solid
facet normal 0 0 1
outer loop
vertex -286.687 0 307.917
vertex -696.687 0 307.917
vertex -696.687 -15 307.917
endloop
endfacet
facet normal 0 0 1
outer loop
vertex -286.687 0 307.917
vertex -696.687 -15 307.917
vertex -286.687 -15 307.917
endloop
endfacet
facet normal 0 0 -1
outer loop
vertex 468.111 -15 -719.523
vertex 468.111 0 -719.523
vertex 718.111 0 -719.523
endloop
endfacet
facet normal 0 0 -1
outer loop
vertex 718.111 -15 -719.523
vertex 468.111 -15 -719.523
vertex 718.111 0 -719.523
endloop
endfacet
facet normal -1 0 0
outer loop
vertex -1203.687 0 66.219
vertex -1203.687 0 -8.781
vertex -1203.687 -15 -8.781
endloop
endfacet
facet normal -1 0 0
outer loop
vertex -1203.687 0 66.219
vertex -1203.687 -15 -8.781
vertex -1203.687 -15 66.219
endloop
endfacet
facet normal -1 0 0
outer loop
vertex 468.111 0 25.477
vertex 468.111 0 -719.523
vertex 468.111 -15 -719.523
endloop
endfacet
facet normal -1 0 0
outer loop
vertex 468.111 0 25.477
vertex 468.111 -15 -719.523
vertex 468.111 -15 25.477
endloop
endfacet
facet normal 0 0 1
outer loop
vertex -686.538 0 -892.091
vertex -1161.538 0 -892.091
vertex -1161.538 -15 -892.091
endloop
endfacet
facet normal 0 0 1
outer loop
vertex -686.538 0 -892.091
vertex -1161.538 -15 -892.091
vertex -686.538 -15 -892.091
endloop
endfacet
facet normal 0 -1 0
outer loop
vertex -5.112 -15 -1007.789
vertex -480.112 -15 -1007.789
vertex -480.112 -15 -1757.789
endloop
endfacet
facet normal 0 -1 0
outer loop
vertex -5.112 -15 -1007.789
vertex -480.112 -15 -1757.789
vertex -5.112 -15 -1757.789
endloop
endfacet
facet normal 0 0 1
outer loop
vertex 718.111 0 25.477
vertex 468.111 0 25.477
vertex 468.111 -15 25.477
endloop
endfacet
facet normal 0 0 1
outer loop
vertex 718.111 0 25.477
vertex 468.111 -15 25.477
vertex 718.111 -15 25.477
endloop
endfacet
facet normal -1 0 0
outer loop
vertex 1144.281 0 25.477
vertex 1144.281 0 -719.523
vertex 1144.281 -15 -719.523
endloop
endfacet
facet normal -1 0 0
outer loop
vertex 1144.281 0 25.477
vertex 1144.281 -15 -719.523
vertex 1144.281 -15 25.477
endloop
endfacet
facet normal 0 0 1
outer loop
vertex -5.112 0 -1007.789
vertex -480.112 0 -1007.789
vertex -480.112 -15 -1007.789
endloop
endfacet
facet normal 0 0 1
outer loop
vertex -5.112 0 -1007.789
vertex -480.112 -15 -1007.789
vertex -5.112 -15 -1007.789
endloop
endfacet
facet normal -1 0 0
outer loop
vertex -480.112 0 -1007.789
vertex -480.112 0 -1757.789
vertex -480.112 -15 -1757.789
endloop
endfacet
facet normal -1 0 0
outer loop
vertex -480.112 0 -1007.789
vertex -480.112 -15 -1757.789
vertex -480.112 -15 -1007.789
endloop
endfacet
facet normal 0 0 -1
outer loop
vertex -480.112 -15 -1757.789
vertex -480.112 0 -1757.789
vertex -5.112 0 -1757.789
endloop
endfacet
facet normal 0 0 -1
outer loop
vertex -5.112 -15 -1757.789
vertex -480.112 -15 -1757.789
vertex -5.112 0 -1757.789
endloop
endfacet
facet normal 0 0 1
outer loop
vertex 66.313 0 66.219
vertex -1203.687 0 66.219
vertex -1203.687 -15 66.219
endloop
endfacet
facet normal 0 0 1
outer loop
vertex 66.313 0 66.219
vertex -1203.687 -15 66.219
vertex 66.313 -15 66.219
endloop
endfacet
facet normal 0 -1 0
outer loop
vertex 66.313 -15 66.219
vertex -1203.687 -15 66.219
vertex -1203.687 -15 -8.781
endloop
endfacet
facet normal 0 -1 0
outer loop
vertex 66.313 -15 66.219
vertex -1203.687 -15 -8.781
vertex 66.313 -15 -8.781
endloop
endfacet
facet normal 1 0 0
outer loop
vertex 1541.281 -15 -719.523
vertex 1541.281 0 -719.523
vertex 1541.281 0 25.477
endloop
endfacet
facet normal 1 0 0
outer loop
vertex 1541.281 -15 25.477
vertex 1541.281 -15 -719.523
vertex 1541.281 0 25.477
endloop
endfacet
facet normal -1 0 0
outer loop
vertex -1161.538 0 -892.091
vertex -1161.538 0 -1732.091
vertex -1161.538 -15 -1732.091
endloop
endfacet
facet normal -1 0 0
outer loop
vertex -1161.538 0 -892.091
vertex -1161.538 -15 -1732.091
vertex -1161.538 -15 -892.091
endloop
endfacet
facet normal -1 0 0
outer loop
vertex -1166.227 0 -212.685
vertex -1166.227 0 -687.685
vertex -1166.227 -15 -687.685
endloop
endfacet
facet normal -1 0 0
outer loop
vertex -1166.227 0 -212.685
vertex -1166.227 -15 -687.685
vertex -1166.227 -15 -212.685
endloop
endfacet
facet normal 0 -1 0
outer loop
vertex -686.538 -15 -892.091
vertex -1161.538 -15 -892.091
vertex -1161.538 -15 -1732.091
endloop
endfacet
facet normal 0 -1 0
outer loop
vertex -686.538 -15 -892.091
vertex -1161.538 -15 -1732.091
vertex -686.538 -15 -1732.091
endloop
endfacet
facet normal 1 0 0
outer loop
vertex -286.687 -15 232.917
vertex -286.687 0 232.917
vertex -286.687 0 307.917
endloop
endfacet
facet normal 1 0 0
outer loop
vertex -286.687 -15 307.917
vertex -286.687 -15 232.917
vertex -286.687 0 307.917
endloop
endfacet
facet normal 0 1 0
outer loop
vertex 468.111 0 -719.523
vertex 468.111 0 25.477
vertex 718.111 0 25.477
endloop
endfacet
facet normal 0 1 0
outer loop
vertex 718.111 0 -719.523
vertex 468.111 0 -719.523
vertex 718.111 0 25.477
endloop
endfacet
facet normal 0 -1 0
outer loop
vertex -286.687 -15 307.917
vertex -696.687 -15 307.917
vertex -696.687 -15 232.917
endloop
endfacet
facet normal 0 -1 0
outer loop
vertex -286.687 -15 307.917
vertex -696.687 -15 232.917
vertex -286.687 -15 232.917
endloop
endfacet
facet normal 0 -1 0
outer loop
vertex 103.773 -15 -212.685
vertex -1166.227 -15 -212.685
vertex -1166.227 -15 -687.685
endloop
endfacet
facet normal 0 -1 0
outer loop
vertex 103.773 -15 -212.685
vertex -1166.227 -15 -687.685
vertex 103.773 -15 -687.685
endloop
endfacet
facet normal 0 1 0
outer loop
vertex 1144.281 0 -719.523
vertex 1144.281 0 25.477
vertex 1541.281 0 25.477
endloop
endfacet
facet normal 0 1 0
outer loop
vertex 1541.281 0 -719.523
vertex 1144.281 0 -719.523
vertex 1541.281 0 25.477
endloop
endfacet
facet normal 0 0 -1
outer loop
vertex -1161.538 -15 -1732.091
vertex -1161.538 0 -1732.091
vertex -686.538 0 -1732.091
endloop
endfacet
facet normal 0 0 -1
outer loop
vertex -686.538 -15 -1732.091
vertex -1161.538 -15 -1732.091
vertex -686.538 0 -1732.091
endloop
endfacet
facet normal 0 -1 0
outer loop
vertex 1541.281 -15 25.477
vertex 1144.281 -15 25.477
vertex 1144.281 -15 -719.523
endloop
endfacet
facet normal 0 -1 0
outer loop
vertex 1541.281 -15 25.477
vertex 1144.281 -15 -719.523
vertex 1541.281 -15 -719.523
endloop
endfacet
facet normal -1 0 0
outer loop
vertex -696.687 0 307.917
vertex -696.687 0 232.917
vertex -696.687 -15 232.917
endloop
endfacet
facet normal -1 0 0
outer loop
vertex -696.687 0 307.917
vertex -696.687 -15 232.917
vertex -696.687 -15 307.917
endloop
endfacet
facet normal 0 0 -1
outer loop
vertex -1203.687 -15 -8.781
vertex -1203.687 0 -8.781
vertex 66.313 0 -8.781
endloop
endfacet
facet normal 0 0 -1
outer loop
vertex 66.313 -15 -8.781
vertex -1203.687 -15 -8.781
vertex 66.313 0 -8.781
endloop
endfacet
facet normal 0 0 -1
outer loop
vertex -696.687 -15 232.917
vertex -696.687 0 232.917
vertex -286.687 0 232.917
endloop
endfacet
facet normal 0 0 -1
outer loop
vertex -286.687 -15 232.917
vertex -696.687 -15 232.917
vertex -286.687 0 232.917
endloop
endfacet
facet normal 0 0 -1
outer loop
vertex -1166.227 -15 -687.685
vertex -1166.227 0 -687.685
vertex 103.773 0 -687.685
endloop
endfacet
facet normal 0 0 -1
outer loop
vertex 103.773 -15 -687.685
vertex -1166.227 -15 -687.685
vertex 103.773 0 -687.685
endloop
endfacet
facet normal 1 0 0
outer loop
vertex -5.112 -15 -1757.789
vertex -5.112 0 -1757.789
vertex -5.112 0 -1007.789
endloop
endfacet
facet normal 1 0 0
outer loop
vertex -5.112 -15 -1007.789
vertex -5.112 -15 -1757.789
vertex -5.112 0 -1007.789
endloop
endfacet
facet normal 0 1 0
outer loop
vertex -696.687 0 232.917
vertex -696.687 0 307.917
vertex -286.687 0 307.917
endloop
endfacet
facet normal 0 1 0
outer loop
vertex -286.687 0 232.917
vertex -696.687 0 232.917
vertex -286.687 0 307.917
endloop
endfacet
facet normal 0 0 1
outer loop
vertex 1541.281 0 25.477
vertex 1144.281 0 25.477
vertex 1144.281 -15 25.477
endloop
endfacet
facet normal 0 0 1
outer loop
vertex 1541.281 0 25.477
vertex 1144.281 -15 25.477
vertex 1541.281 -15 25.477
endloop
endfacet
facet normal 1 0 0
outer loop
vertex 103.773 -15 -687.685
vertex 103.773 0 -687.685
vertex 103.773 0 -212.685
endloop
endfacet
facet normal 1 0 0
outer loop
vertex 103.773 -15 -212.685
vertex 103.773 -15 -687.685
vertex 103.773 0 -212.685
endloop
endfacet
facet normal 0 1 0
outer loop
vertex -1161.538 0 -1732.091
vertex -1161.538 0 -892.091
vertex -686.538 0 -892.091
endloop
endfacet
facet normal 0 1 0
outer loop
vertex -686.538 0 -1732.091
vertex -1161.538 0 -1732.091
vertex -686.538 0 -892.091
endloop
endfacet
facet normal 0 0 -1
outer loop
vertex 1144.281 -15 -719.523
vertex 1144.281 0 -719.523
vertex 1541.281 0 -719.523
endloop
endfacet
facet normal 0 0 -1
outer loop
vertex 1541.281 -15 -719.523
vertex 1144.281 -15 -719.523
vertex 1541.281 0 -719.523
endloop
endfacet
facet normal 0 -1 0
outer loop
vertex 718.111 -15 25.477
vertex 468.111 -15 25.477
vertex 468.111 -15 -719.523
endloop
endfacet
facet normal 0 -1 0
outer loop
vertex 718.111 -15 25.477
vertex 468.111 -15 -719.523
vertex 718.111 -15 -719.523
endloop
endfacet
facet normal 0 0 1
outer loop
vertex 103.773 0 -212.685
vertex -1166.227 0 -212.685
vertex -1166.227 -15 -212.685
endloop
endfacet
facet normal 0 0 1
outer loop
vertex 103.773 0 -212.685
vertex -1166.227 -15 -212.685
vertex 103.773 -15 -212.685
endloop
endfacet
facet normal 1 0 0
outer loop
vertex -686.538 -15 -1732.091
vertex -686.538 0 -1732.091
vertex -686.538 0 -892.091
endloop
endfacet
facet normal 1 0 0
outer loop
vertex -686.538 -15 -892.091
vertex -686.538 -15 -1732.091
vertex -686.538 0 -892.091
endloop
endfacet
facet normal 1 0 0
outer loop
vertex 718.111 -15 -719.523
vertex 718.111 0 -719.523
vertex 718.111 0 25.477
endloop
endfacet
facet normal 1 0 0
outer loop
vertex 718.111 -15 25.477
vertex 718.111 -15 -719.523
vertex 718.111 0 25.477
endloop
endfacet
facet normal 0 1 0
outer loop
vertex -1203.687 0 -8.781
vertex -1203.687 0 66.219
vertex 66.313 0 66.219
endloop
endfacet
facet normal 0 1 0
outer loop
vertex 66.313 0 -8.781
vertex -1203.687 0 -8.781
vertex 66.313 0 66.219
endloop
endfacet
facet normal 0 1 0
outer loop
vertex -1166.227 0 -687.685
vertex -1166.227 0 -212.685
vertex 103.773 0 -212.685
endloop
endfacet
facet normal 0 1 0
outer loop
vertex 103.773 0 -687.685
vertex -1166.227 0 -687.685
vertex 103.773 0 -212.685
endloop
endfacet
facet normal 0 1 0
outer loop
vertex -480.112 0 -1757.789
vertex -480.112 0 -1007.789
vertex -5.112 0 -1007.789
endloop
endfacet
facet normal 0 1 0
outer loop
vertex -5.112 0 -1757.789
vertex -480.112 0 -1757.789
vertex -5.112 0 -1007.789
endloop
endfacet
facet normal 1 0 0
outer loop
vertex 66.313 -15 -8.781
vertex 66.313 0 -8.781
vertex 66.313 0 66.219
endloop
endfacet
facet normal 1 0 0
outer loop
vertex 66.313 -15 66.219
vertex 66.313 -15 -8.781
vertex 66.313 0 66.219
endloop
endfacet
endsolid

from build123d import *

# Parameters (mm, degrees)
F0_W      = 1270
F0_H      = 75
F1_DEPTH  = 15
F2_W      = 1270
F2_H      = 475
F3_DEPTH  = 15
F4_W      = 475
F4_H      = 840
F5_DEPTH  = 15
F6_W      = 410
F6_H      = 75
F7_DEPTH  = 15
F8_W      = 475
F8_H      = 750
F9_DEPTH  = 15
F10_W     = 397
F10_H     = 745
F11_DEPTH = 15
F10_W_2   = 250
F12_DEPTH = 15


with BuildPart() as f1:
    # F0 (on Front) → F1 (new body)
    with BuildSketch(Plane.XZ):
        with Locations((-568.687045, 28.718525)):
            Rectangle(F0_W, F0_H)
    extrude(amount=F1_DEPTH)


with BuildPart() as f3:
    # F2 (on Front) → F3 (new body)
    with BuildSketch(Plane.XZ):
        with Locations((-531.22702, -450.18549)):
            Rectangle(F2_W, F2_H)
    extrude(amount=F3_DEPTH)


with BuildPart() as f5:
    # F4 (on Front) → F5 (new body)
    with BuildSketch(Plane.XZ):
        with Locations((-924.037862, -1312.09095)):
            Rectangle(F4_W, F4_H)
    extrude(amount=F5_DEPTH)


with BuildPart() as f7:
    # F6 (on Front) → F7 (new body)
    with BuildSketch(Plane.XZ):
        with Locations((-491.687016, 270.416832)):
            Rectangle(F6_W, F6_H)
    extrude(amount=F7_DEPTH)


with BuildPart() as f9:
    # F8 (on Front) → F9 (new body)
    with BuildSketch(Plane.XZ):
        with Locations((-242.612016, -1382.789493)):
            Rectangle(F8_W, F8_H)
    extrude(amount=F9_DEPTH)


with BuildPart() as f11:
    # F10 (on Front) → F11 (new body)
    with BuildSketch(Plane.XZ):
        with Locations((1342.781249, -347.023013)):
            Rectangle(F10_W, F10_H)
    extrude(amount=F11_DEPTH)


with BuildPart() as f12:
    # F10 (on Front) → F12 (new body)
    with BuildSketch(Plane.XZ):
        with Locations((593.111008, -347.023013)):
            Rectangle(F10_W_2, F10_H)
    extrude(amount=F12_DEPTH)


solid = Compound([f1.part, f3.part, f5.part, f7.part, f9.part, f11.part, f12.part])
